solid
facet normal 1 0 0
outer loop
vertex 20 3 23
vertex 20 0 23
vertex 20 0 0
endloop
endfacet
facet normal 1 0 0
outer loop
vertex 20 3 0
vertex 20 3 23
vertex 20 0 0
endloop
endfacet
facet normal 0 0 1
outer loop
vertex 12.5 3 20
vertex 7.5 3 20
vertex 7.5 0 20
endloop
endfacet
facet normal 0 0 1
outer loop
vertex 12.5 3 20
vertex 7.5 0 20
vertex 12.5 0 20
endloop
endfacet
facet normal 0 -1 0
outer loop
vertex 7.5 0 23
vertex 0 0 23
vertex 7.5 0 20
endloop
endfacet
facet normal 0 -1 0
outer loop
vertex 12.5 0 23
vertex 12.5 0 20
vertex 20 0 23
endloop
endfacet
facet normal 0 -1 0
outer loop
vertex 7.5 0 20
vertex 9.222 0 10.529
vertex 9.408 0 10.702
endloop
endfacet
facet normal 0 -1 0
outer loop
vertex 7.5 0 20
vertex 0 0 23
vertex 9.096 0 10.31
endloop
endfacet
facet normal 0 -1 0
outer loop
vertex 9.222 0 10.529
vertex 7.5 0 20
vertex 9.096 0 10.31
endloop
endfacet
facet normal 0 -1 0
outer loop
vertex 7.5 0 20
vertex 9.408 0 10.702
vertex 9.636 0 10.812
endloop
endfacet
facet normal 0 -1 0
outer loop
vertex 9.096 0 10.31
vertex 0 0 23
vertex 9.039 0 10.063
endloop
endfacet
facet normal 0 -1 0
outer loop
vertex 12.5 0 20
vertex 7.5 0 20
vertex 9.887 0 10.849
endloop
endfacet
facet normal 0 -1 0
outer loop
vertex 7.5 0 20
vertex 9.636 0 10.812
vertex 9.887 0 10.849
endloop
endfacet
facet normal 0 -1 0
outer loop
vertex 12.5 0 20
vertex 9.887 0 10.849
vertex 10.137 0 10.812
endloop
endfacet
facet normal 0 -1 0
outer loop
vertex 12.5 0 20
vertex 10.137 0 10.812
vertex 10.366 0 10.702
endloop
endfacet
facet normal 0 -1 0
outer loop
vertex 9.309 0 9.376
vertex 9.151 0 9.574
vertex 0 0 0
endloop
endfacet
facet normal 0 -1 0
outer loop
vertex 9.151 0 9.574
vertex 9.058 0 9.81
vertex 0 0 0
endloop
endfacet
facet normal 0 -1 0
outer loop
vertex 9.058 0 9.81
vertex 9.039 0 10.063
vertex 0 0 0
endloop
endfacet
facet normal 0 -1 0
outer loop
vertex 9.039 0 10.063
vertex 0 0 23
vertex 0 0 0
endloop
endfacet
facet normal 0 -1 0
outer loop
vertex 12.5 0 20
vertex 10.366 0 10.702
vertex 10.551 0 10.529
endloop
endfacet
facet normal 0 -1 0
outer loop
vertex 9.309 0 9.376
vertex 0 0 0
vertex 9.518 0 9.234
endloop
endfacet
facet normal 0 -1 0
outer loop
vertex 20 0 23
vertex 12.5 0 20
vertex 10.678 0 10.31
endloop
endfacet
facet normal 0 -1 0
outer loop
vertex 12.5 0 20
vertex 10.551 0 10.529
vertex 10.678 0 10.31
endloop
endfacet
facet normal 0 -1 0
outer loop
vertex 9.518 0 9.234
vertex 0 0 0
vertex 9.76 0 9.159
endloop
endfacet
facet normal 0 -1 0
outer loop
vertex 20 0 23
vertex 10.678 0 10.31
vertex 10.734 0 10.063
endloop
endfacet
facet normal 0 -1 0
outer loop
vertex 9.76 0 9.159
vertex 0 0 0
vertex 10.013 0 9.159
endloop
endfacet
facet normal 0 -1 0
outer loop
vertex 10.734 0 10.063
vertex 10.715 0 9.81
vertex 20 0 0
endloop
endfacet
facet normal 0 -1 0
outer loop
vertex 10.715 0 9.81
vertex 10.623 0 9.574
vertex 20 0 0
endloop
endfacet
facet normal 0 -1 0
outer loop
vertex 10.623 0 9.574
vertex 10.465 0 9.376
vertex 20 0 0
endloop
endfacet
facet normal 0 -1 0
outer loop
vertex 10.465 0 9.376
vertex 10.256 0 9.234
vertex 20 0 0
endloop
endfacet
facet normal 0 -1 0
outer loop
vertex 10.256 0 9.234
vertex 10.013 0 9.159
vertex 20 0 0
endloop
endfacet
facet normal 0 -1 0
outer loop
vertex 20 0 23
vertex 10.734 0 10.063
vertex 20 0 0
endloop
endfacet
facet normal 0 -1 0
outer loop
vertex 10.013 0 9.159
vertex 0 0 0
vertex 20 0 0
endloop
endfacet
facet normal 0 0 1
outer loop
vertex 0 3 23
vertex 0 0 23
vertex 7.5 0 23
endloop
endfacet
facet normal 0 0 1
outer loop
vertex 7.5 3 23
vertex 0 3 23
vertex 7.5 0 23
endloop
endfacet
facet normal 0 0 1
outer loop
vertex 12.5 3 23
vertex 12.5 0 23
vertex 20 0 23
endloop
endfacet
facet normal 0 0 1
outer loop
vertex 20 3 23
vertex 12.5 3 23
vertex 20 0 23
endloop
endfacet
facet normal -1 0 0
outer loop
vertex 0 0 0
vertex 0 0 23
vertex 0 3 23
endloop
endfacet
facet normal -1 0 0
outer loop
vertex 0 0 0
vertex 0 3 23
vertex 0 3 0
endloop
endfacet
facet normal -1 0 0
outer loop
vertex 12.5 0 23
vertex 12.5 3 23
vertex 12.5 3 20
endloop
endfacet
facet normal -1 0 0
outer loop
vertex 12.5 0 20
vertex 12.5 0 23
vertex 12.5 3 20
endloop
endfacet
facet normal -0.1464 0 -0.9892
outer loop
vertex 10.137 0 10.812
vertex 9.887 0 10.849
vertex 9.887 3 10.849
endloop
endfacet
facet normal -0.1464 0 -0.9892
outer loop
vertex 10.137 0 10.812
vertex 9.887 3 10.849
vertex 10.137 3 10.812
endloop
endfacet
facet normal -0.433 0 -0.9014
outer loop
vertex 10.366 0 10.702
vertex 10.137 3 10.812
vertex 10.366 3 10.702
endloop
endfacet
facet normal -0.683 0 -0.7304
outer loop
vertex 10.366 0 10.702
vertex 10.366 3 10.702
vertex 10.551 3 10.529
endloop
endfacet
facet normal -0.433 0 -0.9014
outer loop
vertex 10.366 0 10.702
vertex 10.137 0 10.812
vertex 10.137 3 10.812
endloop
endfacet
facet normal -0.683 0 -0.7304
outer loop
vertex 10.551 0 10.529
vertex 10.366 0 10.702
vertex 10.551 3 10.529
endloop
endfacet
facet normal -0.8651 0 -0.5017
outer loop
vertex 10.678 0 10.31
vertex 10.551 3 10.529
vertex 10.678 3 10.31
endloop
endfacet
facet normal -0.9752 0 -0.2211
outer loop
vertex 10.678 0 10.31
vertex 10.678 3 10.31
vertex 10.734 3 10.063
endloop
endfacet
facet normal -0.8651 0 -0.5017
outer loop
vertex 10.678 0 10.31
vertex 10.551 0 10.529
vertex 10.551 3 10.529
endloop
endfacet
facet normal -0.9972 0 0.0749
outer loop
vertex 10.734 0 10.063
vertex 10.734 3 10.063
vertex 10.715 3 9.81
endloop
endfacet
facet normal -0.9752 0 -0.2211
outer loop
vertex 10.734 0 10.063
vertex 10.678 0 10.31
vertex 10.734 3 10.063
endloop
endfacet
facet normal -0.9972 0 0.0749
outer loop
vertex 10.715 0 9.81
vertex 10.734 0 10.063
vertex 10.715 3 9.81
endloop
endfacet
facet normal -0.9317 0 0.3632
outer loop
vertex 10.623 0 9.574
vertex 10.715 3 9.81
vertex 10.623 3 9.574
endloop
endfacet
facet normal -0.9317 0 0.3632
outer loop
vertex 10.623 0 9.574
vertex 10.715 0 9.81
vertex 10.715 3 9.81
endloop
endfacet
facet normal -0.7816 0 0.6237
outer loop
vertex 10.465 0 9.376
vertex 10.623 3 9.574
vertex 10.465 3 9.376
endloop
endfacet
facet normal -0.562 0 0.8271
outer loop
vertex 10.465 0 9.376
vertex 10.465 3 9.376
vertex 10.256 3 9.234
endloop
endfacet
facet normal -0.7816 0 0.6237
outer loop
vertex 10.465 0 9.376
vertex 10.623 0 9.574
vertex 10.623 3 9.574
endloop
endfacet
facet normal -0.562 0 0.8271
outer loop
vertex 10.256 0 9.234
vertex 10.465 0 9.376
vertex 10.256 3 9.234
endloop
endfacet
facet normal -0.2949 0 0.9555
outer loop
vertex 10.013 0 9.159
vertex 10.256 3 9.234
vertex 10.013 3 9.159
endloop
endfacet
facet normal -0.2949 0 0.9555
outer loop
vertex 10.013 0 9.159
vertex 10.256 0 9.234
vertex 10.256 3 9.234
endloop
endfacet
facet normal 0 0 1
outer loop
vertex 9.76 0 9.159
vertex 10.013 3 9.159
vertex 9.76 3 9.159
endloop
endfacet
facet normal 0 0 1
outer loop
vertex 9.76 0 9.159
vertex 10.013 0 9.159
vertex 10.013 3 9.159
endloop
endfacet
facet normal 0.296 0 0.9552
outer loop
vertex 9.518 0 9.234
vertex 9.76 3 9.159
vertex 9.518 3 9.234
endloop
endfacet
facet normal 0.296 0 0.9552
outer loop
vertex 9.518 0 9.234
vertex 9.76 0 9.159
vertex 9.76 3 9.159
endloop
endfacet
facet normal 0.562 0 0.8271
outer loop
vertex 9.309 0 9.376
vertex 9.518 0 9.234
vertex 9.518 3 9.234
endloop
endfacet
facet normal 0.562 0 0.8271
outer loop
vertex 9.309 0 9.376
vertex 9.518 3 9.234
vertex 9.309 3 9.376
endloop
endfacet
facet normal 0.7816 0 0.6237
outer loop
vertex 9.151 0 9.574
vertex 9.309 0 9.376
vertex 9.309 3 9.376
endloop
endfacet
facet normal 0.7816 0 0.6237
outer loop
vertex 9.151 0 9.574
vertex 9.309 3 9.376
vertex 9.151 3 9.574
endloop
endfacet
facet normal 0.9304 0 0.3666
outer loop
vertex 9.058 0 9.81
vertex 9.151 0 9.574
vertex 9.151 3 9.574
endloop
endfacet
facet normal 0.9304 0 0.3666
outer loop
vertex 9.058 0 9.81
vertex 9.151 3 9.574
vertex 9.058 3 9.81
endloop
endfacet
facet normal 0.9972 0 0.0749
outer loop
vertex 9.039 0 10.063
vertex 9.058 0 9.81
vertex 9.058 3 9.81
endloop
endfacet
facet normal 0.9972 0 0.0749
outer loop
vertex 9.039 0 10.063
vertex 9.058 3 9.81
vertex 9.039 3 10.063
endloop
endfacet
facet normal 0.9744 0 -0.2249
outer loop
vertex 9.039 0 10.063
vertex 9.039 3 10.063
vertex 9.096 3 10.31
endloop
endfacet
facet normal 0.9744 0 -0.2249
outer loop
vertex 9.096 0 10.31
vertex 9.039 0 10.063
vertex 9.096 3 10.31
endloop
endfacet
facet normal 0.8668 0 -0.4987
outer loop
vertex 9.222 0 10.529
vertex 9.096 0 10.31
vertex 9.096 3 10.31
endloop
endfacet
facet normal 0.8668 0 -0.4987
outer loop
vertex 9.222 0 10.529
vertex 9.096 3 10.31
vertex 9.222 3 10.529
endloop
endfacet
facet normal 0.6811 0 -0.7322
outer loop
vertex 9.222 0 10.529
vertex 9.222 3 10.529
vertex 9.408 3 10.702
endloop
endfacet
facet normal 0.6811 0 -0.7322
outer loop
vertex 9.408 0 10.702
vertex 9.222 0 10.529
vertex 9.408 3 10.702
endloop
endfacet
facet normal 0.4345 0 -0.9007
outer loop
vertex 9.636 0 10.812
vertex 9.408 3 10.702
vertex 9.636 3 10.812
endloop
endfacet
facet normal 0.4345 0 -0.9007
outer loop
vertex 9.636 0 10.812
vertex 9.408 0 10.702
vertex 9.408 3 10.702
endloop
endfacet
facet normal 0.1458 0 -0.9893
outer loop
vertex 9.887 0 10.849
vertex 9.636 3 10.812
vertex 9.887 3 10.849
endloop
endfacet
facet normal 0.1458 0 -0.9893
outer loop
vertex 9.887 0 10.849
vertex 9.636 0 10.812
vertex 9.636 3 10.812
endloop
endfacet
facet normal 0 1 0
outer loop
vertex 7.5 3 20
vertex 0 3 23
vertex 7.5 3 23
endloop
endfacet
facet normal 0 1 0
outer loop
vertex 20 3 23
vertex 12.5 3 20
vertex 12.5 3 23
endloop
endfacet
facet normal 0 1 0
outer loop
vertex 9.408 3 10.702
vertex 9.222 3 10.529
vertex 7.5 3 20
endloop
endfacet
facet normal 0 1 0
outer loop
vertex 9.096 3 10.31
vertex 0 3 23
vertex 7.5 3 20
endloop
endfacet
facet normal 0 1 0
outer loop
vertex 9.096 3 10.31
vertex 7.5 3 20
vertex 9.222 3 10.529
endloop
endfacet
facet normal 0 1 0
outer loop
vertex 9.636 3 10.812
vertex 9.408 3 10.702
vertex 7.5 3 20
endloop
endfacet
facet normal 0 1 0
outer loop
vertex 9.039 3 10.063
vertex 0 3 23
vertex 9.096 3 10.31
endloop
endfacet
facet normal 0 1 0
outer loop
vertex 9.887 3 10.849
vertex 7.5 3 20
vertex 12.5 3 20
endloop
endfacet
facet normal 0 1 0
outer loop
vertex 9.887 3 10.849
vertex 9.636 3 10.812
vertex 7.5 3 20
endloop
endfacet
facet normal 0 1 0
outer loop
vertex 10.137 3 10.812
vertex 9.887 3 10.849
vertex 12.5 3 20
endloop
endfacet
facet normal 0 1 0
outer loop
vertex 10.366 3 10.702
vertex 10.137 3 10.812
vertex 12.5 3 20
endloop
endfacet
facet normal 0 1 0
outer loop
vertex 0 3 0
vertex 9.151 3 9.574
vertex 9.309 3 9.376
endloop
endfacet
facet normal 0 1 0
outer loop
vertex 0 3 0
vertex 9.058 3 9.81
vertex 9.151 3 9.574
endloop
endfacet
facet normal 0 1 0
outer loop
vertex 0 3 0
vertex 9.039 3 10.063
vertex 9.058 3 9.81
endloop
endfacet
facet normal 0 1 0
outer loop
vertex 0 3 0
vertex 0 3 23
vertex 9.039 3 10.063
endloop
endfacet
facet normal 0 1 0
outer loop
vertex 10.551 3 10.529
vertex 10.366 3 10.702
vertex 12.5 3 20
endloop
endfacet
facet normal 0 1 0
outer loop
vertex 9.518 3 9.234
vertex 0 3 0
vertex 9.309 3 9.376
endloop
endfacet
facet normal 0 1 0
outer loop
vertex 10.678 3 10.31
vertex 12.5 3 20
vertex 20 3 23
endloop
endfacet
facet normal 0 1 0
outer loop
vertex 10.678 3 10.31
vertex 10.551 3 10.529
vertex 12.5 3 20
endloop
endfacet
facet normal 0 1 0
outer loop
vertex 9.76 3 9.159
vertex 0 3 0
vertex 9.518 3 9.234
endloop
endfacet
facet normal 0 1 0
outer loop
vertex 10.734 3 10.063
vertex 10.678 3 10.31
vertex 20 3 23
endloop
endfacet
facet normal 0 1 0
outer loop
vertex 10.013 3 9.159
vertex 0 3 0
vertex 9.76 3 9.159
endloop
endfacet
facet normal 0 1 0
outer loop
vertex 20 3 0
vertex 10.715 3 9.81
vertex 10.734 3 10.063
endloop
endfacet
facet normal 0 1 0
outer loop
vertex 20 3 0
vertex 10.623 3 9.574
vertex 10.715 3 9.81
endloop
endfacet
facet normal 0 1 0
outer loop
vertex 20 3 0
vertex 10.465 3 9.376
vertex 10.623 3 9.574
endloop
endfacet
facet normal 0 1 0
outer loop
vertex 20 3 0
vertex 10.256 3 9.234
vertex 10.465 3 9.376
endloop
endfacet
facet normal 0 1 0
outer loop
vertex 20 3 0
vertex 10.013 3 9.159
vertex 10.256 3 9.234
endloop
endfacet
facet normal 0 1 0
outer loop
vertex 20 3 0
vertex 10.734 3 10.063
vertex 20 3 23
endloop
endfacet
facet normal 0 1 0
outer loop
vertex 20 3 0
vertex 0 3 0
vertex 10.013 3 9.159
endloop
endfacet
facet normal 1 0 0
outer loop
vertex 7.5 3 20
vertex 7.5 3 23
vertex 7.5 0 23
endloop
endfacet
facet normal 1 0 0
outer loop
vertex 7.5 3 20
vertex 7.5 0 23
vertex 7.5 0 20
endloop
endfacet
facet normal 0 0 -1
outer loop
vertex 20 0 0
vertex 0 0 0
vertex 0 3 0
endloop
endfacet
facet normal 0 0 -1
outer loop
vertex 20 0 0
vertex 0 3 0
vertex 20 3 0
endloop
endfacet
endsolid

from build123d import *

# Parameters (mm, degrees)
SKETCH1_W           = 20
SKETCH1_H           = 23
SKETCH1_R           = 0.85
BOSS_EXTRUDE1_DEPTH = 3
SKETCH3_W           = 5
SKETCH3_H           = 3
CUT_EXTRUDE1_DEPTH  = 31.626785662


with BuildPart() as part:
    # Sketch1 → Boss-Extrude1 (new body)
    with BuildSketch(Plane(origin=(0, 0, 0), x_dir=(1, 0, 0), z_dir=(0, 1, 0))):
        with Locations((10, -11.5)):
            Rectangle(SKETCH1_W, SKETCH1_H)
        with Locations(Location((9.886762672, -9.999358845, 0), (0, 0, 270))):
            Circle(SKETCH1_R, mode=Mode.SUBTRACT)
    extrude(amount=BOSS_EXTRUDE1_DEPTH)

    # Sketch3 → Cut-Extrude1 (cut, through all)
    with BuildSketch(Plane(origin=(0, 3, 0), x_dir=(1, 0, 0), z_dir=(0, 1, 0))):
        with Locations((10, -21.5)):
            Rectangle(SKETCH3_W, SKETCH3_H)
    extrude(amount=-CUT_EXTRUDE1_DEPTH, mode=Mode.SUBTRACT)


solid = part.part
